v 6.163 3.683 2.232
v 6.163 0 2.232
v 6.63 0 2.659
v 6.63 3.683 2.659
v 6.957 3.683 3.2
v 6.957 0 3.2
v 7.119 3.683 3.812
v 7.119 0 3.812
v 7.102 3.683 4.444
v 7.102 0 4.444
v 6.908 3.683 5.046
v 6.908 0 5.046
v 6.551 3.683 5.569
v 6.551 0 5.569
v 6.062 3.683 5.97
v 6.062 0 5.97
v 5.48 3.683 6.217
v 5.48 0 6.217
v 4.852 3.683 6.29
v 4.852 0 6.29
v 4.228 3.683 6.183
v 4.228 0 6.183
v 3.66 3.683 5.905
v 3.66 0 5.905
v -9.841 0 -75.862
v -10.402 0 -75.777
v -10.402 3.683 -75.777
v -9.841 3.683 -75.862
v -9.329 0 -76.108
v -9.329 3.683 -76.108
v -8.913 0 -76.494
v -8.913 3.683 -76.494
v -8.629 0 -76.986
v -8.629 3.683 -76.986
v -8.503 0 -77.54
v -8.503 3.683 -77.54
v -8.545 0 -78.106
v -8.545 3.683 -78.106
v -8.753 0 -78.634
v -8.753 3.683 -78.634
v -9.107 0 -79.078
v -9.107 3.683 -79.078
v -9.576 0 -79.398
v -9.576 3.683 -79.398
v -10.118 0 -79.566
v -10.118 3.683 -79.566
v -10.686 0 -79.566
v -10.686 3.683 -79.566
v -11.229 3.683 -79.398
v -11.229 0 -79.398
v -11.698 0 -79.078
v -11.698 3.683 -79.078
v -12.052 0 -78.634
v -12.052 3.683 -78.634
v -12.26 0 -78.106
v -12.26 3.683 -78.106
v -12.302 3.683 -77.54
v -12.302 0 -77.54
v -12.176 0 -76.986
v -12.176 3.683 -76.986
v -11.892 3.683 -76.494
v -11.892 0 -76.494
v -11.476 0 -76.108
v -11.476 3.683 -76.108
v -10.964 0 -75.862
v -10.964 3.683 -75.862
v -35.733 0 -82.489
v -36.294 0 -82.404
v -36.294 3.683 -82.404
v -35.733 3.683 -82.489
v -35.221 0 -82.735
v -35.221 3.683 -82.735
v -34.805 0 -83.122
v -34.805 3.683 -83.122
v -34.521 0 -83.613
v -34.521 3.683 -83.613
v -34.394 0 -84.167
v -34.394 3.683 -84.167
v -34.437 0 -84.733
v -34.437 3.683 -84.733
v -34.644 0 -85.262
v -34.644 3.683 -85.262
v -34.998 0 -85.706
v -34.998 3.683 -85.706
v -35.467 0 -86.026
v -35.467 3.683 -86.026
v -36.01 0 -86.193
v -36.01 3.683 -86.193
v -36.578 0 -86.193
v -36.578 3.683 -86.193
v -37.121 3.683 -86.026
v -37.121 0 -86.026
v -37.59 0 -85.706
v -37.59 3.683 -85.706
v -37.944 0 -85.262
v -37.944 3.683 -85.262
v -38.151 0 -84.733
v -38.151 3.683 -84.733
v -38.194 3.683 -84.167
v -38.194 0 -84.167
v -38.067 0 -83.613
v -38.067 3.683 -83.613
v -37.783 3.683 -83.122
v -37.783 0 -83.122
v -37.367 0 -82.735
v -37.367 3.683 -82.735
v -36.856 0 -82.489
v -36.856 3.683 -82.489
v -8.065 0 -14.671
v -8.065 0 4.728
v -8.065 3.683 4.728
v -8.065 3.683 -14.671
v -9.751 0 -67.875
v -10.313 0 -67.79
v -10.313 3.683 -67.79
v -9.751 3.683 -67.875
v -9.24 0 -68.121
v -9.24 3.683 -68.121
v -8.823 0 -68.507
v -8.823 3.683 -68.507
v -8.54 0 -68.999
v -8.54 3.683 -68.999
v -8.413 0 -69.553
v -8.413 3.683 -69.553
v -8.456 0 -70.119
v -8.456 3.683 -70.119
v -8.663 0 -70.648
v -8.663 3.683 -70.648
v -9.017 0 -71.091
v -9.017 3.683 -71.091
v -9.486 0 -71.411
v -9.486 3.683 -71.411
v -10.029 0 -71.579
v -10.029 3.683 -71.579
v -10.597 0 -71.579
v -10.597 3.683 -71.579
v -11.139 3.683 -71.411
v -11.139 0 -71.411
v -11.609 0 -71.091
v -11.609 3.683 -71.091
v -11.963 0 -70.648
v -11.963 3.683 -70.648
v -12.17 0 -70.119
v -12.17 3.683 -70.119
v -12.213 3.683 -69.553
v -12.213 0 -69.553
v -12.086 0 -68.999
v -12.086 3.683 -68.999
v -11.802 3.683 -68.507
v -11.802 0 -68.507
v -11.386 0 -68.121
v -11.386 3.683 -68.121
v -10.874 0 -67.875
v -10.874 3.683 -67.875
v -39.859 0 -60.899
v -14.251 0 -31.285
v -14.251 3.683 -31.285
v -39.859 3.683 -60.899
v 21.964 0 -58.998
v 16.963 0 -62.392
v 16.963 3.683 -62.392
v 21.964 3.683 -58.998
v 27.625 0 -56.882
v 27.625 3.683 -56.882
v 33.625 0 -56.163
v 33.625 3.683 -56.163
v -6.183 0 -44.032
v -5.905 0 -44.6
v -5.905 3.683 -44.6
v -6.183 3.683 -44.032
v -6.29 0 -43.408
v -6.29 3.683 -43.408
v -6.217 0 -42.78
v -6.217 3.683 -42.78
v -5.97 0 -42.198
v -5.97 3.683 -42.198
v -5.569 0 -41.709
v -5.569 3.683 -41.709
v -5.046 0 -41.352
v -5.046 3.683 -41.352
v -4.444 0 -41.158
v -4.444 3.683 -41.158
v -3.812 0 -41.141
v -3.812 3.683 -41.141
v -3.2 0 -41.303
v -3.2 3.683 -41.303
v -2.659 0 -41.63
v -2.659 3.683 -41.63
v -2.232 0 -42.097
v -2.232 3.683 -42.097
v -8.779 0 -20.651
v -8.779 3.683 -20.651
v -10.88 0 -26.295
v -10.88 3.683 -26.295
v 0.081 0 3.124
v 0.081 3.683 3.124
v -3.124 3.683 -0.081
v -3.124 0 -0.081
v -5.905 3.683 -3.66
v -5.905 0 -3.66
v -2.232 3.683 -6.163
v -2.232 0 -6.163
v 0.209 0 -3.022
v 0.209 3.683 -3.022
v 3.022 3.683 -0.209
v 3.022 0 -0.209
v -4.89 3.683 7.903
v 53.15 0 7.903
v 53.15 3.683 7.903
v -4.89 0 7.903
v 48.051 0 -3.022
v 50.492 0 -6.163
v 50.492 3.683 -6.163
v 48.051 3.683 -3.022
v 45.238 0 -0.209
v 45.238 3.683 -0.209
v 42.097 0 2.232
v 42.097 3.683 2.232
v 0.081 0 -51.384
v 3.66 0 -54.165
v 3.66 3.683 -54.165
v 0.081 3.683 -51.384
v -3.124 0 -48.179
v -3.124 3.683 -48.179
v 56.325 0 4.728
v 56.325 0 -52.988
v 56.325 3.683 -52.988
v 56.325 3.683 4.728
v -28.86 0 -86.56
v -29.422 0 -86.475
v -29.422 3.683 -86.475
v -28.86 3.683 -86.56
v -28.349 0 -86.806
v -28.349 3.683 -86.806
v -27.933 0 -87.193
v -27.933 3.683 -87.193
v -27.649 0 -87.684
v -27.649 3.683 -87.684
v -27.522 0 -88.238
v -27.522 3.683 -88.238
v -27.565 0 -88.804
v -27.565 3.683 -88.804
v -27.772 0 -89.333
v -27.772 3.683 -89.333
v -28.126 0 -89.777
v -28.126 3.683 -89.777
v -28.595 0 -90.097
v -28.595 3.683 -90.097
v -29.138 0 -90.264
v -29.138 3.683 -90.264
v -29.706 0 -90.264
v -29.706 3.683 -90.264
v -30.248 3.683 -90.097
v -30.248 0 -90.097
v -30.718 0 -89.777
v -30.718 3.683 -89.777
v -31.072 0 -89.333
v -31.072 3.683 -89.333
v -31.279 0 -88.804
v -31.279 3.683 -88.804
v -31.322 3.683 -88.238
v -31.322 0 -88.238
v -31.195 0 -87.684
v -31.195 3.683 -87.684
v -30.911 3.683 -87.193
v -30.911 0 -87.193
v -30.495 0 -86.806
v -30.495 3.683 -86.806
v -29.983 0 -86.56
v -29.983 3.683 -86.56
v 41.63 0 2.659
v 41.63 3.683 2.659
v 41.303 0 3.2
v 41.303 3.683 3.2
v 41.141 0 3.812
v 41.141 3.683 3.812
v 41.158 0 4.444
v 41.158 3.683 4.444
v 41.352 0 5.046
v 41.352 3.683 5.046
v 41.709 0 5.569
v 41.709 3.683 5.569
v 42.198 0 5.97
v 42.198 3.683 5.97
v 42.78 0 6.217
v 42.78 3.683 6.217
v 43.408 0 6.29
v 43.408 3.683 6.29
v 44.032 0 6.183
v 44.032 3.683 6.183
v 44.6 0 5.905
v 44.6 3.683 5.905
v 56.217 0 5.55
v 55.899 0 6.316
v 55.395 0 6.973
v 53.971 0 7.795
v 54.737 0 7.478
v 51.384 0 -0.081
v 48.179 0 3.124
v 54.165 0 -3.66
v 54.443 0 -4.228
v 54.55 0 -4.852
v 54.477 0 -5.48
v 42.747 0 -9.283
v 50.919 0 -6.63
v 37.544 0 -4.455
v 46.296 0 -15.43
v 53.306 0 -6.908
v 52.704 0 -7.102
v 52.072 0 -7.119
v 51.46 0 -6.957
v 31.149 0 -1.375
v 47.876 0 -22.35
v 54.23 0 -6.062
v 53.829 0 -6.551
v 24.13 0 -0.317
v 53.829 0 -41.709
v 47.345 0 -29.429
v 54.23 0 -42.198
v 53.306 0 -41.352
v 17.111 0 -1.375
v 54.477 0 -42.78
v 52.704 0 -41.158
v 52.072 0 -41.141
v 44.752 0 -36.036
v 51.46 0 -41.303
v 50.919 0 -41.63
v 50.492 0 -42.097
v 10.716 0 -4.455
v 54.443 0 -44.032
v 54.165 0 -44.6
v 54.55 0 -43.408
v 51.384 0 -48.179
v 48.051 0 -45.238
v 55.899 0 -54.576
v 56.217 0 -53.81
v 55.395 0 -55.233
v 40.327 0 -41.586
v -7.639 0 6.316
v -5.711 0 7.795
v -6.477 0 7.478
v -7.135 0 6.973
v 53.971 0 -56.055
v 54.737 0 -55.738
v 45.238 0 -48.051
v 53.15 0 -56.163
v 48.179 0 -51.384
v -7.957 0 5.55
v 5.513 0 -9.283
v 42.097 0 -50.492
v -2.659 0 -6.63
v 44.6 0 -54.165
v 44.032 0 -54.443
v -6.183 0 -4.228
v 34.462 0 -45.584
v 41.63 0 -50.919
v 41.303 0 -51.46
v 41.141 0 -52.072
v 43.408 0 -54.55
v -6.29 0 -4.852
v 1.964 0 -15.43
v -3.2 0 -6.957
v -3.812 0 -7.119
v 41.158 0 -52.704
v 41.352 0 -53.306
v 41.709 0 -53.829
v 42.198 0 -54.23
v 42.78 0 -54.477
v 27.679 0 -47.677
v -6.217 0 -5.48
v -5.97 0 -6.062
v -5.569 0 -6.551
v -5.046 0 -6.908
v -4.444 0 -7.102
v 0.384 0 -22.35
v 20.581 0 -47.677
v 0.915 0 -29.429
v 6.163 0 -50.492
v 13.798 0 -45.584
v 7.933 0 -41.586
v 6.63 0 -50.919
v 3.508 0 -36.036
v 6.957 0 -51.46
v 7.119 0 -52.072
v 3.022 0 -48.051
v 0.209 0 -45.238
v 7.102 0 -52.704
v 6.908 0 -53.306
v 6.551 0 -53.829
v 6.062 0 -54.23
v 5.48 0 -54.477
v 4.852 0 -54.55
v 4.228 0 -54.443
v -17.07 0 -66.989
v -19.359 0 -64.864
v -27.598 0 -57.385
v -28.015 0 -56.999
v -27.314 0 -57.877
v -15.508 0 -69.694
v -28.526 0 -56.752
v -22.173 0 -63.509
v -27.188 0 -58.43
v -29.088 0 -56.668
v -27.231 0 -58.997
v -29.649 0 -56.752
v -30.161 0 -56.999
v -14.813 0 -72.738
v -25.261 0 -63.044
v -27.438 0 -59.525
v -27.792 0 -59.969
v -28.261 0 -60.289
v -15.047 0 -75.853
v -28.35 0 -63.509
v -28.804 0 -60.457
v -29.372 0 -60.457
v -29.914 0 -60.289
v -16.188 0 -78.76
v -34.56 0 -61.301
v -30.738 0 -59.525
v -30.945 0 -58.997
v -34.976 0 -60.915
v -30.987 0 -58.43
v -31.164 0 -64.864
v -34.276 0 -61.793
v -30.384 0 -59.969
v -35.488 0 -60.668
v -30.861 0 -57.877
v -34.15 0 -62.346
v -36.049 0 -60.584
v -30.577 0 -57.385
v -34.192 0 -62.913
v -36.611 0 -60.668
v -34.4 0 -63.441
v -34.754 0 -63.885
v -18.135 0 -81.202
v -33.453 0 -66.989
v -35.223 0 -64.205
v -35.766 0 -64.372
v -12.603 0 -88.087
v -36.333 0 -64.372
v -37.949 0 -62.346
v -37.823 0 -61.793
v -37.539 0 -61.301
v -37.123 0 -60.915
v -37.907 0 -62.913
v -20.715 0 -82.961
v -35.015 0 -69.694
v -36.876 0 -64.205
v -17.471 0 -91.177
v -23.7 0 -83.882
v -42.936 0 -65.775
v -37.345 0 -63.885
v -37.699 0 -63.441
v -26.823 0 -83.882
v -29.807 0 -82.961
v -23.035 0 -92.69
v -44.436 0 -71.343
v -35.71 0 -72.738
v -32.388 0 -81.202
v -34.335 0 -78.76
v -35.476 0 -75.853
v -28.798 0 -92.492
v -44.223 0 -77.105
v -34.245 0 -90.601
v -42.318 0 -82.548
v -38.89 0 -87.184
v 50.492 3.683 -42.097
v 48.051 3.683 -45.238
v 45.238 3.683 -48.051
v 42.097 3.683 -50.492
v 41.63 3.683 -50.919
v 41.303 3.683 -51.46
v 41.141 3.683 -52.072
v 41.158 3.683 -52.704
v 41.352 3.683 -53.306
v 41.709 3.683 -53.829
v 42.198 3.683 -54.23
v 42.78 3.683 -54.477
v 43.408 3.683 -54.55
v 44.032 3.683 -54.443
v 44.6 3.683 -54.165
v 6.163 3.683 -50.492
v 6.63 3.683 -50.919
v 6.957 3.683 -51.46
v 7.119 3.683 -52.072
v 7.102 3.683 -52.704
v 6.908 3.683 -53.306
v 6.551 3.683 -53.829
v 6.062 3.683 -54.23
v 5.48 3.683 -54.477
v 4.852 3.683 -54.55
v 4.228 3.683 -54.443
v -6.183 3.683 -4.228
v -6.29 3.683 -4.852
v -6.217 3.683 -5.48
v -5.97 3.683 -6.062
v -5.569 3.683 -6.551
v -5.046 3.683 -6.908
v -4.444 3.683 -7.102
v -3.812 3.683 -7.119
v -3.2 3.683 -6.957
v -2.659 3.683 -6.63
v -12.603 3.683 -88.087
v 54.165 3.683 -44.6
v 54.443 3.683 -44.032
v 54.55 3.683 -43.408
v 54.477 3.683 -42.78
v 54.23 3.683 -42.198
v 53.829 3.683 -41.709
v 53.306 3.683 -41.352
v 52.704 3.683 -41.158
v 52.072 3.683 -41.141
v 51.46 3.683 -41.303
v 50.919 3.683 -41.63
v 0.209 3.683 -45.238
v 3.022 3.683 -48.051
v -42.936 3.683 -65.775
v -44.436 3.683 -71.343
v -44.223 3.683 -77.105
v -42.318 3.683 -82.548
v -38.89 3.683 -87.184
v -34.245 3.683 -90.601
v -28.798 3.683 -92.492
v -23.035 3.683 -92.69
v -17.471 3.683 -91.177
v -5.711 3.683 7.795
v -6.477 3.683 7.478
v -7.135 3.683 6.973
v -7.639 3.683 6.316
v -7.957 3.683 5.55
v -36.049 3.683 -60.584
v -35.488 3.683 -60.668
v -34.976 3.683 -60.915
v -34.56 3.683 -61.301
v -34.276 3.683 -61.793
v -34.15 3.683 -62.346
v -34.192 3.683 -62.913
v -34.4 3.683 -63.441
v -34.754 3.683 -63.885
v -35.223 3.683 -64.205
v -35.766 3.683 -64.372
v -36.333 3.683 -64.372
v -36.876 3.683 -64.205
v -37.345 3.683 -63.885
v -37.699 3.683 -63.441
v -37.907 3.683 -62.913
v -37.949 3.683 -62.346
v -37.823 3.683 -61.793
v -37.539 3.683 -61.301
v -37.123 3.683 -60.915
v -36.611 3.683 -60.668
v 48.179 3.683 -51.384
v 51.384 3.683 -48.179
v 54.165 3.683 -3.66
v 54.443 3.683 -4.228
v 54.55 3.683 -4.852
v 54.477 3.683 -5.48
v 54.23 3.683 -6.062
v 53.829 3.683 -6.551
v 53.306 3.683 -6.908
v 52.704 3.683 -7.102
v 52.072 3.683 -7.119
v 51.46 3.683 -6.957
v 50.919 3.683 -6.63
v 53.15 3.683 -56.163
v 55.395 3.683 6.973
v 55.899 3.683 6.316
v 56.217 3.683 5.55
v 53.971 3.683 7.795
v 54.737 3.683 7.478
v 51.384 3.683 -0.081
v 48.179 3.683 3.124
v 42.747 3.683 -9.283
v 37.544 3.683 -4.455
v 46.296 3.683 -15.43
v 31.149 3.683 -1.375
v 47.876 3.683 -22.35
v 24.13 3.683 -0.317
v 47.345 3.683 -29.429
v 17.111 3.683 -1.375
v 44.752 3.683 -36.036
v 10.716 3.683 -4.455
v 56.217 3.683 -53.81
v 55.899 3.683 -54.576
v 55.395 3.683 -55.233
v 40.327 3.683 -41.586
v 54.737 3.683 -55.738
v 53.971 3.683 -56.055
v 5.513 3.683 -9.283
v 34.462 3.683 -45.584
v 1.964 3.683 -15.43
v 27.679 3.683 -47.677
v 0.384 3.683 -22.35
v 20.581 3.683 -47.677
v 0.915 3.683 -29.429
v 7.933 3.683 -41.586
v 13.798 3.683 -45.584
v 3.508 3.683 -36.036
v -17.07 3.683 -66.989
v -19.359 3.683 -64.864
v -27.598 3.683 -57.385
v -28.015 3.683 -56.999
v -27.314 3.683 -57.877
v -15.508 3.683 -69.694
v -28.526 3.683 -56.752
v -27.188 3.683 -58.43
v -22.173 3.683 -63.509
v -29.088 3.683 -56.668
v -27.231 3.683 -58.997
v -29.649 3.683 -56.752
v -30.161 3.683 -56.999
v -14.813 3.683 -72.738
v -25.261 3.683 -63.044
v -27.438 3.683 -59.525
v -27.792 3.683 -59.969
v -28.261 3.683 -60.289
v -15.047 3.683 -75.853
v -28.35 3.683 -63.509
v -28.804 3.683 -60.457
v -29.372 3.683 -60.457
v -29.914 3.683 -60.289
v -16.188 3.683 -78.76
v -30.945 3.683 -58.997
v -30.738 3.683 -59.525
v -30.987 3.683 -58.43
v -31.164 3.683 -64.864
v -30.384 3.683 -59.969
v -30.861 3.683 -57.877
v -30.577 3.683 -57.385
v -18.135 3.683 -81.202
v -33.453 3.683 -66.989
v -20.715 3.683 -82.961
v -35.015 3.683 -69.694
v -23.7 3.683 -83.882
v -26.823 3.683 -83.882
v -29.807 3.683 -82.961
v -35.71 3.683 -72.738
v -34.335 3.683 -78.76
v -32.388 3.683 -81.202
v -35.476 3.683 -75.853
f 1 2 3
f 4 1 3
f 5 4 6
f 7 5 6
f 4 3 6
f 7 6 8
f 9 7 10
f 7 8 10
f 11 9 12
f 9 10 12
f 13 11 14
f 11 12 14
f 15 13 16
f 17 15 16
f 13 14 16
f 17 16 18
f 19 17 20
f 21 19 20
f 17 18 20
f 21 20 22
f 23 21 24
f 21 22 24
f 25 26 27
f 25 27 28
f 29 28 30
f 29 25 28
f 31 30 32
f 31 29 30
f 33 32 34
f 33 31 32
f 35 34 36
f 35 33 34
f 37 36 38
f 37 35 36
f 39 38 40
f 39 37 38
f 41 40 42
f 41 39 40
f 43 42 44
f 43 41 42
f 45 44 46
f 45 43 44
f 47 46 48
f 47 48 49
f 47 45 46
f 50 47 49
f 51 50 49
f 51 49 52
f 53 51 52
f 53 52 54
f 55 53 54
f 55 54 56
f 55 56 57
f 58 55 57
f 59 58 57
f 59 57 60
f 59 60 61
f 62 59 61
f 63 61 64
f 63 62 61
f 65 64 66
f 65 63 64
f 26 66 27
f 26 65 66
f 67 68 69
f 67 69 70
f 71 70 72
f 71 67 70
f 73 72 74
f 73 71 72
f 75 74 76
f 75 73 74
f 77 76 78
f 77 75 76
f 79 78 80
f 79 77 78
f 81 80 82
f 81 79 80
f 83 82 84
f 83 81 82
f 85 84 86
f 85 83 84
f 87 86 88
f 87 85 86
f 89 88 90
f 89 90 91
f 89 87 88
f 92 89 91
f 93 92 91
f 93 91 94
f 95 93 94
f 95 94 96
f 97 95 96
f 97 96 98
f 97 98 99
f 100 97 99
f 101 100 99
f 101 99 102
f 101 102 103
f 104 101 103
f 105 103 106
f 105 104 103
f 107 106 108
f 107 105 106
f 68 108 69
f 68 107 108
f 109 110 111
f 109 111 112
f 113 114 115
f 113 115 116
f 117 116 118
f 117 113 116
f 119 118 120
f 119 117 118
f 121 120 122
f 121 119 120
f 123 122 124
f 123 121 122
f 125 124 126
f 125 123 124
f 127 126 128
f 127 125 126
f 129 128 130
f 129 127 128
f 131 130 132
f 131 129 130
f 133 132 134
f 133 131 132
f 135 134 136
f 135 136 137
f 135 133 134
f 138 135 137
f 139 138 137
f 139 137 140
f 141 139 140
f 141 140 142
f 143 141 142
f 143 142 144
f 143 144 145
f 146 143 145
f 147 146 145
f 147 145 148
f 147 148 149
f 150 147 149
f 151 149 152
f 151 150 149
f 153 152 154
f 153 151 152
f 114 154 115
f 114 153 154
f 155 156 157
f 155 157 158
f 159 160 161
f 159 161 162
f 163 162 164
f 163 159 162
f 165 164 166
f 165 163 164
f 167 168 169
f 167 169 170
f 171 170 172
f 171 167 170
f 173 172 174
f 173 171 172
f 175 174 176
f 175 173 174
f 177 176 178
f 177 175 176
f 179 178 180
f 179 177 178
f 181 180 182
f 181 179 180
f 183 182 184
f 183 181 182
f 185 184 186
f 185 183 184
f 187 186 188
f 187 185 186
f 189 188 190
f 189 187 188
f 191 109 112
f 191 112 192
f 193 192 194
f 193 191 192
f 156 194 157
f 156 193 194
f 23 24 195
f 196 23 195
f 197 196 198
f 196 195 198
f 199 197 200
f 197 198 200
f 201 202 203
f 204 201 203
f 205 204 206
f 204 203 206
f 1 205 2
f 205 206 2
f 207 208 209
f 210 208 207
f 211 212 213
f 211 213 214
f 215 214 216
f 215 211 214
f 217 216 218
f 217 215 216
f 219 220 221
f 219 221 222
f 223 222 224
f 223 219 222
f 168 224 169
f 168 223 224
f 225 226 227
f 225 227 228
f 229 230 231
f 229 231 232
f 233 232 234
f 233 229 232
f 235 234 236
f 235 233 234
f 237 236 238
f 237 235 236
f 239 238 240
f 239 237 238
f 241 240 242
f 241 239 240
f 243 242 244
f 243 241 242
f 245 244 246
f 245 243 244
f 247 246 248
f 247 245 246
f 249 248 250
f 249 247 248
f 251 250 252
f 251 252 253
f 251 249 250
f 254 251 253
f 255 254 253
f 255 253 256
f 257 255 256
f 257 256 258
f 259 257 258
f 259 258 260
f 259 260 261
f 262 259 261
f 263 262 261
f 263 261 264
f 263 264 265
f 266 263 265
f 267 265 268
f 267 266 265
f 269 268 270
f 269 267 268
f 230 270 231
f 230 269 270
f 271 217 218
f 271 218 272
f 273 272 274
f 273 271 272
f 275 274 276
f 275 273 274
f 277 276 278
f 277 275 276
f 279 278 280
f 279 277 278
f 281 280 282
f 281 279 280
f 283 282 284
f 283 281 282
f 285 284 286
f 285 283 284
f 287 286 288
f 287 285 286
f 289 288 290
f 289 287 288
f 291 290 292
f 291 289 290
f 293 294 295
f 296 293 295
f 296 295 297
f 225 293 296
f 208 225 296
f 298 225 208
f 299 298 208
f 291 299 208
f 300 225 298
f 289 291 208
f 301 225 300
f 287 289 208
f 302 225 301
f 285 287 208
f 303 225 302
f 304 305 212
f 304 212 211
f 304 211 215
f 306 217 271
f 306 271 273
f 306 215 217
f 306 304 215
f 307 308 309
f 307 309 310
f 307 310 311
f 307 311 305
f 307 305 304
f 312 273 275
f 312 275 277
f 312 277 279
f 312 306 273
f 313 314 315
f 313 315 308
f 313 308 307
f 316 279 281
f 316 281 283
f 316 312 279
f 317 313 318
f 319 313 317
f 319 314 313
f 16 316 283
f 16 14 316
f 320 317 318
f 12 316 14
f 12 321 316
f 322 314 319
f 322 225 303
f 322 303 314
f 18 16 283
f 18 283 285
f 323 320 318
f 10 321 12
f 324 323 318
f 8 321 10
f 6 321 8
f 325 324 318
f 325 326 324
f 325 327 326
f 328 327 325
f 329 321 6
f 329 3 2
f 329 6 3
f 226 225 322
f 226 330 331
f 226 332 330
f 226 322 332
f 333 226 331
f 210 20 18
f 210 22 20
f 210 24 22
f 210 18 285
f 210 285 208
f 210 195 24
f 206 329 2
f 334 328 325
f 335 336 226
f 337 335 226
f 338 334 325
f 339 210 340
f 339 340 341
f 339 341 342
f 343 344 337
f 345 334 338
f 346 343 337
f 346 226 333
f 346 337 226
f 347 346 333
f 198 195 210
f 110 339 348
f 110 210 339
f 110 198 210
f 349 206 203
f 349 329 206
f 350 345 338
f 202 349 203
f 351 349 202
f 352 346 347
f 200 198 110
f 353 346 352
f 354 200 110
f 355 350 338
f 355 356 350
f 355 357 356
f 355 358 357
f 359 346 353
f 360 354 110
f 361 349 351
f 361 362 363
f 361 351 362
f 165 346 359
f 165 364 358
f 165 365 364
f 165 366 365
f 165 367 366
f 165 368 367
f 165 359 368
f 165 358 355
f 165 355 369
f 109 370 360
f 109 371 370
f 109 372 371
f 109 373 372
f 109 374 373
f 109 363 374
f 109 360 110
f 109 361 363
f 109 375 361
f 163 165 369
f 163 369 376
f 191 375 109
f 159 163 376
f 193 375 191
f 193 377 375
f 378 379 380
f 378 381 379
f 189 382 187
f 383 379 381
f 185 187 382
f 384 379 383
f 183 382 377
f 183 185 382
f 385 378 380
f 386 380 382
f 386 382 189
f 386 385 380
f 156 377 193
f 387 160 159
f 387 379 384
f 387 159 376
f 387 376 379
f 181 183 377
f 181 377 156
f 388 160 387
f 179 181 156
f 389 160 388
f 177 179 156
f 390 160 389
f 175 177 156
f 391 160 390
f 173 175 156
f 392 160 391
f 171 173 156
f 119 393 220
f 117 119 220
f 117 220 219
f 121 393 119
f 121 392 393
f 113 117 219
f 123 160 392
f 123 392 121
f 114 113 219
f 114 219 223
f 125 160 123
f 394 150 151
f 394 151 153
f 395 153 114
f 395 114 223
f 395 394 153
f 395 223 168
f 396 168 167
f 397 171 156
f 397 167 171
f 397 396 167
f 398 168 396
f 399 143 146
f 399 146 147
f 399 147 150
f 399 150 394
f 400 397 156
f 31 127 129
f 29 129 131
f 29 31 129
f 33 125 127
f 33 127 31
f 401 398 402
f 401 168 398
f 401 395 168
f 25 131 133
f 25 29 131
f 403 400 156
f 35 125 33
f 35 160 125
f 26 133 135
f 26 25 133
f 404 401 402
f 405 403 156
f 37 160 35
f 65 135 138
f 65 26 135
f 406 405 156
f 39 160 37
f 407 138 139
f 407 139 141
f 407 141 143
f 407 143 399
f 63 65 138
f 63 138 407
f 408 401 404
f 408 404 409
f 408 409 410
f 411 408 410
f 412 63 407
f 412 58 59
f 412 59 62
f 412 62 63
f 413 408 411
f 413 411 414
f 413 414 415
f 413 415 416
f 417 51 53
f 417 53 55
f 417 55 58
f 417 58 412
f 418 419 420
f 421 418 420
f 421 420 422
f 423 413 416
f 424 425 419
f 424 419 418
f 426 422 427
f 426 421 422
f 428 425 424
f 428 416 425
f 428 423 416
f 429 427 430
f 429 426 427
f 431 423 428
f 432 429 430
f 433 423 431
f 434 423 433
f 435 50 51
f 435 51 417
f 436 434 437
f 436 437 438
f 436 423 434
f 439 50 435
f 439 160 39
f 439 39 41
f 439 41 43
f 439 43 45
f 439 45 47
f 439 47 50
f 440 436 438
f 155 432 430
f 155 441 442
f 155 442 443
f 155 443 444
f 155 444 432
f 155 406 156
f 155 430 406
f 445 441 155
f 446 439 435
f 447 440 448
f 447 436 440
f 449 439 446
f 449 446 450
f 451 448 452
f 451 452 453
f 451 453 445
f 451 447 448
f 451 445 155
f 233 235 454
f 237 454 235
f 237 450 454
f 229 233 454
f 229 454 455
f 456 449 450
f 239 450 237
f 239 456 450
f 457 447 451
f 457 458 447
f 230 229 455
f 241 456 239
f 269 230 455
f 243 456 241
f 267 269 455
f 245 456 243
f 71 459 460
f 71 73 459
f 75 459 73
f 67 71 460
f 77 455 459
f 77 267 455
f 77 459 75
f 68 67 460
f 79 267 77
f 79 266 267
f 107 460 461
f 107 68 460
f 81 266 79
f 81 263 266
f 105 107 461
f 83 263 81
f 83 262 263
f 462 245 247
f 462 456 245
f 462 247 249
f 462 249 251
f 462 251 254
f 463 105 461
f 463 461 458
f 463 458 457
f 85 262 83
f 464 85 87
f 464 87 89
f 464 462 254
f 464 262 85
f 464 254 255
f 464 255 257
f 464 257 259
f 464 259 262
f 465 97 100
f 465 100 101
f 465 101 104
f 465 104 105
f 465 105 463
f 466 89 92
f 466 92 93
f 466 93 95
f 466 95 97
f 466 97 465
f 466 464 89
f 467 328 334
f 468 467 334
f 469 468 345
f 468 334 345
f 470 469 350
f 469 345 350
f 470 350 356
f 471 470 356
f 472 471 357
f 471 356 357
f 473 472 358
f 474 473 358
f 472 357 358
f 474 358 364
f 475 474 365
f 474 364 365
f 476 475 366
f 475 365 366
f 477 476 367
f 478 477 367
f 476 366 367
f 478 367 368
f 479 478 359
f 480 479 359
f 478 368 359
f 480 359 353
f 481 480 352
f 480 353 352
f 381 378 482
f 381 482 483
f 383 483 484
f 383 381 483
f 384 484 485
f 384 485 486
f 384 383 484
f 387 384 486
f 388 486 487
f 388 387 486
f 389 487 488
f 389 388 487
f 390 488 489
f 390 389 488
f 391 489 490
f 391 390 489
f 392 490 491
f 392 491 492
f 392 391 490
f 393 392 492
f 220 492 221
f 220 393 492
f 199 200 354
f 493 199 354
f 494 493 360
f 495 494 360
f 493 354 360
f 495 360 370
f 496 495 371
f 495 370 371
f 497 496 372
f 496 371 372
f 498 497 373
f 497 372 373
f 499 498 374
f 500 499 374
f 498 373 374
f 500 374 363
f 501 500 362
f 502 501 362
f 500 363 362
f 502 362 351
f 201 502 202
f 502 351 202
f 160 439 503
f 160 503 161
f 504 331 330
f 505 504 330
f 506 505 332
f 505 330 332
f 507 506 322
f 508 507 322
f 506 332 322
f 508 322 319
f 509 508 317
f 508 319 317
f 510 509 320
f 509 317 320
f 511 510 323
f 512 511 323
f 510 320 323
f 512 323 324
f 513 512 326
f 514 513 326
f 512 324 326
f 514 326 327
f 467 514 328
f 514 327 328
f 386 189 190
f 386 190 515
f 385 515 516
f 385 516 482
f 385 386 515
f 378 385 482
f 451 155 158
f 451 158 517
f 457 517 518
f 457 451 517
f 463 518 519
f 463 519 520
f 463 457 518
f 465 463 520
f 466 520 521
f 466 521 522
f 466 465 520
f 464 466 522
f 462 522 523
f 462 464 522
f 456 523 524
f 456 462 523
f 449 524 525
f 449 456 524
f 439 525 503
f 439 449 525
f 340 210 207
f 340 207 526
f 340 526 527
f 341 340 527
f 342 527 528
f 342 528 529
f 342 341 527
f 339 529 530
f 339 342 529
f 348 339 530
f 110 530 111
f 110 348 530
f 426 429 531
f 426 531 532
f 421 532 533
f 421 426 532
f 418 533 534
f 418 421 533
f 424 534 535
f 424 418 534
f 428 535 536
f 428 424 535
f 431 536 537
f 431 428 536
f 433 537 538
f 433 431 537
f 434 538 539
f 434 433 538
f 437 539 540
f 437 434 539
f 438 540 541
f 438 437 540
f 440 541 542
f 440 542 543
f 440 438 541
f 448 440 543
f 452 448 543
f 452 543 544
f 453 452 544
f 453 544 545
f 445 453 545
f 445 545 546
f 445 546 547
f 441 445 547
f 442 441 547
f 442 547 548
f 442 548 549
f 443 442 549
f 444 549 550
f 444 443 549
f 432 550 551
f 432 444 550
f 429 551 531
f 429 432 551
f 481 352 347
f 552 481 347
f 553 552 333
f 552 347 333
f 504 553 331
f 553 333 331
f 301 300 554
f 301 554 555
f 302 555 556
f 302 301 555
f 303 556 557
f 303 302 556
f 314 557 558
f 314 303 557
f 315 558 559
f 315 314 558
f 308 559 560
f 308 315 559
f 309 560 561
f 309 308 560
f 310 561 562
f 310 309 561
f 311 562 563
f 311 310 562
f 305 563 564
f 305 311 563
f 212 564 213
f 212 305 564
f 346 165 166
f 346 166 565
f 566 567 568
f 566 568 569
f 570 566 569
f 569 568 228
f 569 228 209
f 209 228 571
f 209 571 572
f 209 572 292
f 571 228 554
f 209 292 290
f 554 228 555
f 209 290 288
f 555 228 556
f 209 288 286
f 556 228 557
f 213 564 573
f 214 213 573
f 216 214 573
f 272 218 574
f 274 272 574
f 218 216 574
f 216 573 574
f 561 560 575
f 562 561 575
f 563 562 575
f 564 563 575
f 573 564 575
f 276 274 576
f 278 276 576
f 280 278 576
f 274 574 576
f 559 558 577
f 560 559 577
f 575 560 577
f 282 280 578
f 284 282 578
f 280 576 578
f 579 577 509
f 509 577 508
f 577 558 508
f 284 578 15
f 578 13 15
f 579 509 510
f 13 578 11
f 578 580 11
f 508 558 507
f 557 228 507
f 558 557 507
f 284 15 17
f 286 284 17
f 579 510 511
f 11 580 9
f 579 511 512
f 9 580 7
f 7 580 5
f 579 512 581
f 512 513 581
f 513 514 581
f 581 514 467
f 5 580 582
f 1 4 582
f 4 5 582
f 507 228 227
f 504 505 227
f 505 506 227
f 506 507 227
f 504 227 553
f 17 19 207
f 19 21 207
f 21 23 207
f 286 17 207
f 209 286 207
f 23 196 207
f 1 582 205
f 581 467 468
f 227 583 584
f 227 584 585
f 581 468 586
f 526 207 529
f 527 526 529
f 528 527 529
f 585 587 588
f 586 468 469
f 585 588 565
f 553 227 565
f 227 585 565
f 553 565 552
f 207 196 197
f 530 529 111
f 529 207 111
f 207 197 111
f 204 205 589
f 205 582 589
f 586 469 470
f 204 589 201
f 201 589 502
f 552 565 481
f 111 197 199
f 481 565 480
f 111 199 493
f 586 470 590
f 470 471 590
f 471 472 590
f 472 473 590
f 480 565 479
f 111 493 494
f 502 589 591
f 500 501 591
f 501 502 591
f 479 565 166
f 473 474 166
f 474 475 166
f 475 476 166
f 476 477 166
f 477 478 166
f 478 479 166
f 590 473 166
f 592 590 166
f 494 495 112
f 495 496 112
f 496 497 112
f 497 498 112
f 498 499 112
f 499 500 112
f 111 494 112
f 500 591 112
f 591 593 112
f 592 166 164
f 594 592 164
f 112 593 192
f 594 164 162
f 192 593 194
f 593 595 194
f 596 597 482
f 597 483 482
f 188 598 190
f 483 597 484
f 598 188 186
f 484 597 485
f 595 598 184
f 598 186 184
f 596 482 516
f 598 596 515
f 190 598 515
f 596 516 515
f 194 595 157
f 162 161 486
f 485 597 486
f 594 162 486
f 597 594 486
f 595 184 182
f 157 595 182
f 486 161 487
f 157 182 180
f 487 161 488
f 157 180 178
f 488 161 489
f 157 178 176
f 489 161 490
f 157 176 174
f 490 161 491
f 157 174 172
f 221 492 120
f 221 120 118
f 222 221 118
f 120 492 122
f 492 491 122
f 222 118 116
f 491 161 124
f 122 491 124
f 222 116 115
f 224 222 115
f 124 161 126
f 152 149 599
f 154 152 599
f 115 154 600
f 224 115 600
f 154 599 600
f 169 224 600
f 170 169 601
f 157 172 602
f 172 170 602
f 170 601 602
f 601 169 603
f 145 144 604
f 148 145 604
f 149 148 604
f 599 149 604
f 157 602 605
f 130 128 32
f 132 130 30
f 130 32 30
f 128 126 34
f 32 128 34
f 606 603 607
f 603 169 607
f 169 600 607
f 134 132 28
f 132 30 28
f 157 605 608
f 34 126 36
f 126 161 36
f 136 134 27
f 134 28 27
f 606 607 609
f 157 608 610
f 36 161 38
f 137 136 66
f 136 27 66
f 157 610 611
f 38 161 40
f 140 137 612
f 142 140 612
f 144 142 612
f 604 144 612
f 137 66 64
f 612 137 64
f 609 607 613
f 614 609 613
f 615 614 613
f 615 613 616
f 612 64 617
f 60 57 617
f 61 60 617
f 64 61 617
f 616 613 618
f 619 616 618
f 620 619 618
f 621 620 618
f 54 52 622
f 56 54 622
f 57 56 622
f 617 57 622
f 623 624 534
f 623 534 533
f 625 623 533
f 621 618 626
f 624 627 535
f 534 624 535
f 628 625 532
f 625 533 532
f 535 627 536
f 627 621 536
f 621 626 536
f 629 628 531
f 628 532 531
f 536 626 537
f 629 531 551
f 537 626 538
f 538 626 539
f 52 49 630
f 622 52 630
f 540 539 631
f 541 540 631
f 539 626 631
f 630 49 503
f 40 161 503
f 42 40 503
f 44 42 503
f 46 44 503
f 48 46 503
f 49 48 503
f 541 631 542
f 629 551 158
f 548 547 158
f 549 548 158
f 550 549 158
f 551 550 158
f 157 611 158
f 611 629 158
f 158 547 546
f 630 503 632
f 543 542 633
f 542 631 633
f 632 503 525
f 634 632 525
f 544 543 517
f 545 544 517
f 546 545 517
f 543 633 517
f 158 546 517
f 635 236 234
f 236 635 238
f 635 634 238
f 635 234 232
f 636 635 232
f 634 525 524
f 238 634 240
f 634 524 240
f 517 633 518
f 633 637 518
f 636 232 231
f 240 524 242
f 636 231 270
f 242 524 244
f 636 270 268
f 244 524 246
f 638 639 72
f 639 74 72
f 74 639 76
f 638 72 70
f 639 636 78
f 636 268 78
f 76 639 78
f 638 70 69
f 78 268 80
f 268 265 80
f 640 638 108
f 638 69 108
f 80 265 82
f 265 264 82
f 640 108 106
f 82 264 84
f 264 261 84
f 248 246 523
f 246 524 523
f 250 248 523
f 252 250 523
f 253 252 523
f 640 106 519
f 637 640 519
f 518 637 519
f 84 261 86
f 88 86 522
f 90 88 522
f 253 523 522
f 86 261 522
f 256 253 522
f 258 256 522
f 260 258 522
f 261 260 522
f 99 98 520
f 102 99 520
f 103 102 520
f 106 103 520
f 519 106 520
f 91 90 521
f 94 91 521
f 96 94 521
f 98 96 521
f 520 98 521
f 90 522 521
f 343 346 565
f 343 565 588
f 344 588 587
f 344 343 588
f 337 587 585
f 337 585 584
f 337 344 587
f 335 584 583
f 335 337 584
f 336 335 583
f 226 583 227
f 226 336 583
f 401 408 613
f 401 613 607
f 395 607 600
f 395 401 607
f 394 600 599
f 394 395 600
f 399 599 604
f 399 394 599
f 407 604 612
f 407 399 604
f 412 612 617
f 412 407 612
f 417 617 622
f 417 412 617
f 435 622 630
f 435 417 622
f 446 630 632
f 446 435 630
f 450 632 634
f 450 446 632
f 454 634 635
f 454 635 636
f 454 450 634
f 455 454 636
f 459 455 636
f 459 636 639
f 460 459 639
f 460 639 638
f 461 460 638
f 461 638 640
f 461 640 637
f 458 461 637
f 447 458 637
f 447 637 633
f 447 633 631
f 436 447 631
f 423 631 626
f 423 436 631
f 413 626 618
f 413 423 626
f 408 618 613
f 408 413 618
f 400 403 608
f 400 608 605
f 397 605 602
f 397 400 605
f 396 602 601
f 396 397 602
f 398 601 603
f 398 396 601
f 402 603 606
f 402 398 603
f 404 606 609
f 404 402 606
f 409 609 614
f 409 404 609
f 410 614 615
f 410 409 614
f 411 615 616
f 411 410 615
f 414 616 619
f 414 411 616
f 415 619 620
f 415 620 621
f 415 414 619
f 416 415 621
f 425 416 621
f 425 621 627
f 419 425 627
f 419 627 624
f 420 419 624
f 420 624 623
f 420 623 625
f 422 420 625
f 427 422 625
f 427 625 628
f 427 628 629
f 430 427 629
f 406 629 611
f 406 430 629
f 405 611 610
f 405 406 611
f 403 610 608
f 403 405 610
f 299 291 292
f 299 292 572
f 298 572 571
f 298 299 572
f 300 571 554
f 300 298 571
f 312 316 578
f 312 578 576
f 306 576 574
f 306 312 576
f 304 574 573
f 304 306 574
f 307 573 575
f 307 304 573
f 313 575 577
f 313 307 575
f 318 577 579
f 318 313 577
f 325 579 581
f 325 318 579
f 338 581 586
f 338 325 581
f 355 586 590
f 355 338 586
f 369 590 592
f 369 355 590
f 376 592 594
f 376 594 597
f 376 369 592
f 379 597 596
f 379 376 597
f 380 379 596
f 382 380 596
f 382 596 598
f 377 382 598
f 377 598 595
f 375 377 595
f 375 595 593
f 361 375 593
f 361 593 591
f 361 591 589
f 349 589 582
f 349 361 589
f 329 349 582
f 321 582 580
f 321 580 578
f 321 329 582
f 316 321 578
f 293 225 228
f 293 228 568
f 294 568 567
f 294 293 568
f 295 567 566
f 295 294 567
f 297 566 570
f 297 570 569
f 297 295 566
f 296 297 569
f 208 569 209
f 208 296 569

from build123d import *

# Parameters (mm, degrees)
SKETCH1_R           = 23.8125
SKETCH1_R_2         = 10.4775
SKETCH1_R_3         = 1.905
BOSS_EXTRUDE1_DEPTH = 3.683


with BuildPart() as part:
    # Sketch1 → Boss-Extrude1 (new body)
    with BuildSketch(Plane(origin=(0, 0, 0), x_dir=(1, 0, 0), z_dir=(0, 1, 0))):
        with BuildLine():
            Line((-8.06473402, -4.72806869), (-8.06473402, 14.671308994))
            ThreePointArc((-8.06473402, 14.671308994), (-9.661605647, 23.535341917), (-14.251433206, 31.284829748))
            Line((-14.251433206, 31.284829748), (-39.858713959, 60.899286273))
            ThreePointArc((-39.858713959, 60.899286273), (-38.889761495, 87.184032671), (-12.602664438, 88.086967018))
            Line((-12.602664438, 88.086967018), (16.963304526, 62.391553913))
            ThreePointArc((16.963304526, 62.391553913), (24.731110608, 57.771090259), (33.625027761, 56.16306869))
            Line((33.625027761, 56.16306869), (53.14973402, 56.16306869))
            ThreePointArc((53.14973402, 56.16306869), (55.39479805, 55.23313272), (56.32473402, 52.98806869))
            Line((56.32473402, 52.98806869), (56.32473402, -4.72806869))
            ThreePointArc((56.32473402, -4.72806869), (55.39479805, -6.97313272), (53.14973402, -7.90306869))
            Line((53.14973402, -7.90306869), (-4.88973402, -7.90306869))
            ThreePointArc((-4.88973402, -7.90306869), (-7.13479805, -6.97313272), (-8.06473402, -4.72806869))
        make_face()
        with Locations(Location((24.13, 24.13, 0), (0, 0, 270))):
            Circle(SKETCH1_R, mode=Mode.SUBTRACT)
        with Locations(Location((-25.261408666, 73.521408666, 0), (0, 0, 270))):
            Circle(SKETCH1_R_2, mode=Mode.SUBTRACT)
        with Locations(Location((-36.294042469, 84.309426168, 0), (0, 0, 270))):
            Circle(SKETCH1_R_3, mode=Mode.SUBTRACT)
        with Locations(Location((-29.421941059, 88.38042278, 0), (0, 0, 270))):
            Circle(SKETCH1_R_3, mode=Mode.SUBTRACT)
        with Locations(Location((-10.402394551, 77.681941059, 0), (0, 0, 270))):
            Circle(SKETCH1_R_3, mode=Mode.SUBTRACT)
        with Locations(Location((-10.312858771, 69.695028354, 0), (0, 0, 270))):
            Circle(SKETCH1_R_3, mode=Mode.SUBTRACT)
        with Locations(Location((-29.087788977, 58.572858771, 0), (0, 0, 270))):
            Circle(SKETCH1_R_3, mode=Mode.SUBTRACT)
        with Locations(Location((-36.049426168, 62.488774863, 0), (0, 0, 270))):
            Circle(SKETCH1_R_3, mode=Mode.SUBTRACT)
        with BuildLine():
            ThreePointArc((44.60009114, -5.905215683), (49.831544821, -1.571544821), (54.165215683, 3.65990886))
            ThreePointArc((54.165215683, 3.65990886), (53.580347261, 6.748102738), (50.492153383, 6.163234317))
            ThreePointArc((50.492153383, 6.163234317), (46.688455179, 1.571544821), (42.096765683, -2.232153383))
            ThreePointArc((42.096765683, -2.232153383), (41.511897262, -5.320347261), (44.60009114, -5.905215683))
        make_face(mode=Mode.SUBTRACT)
        with BuildLine():
            ThreePointArc((44.60009114, 54.165215683), (49.831544821, 49.831544821), (54.165215683, 44.60009114))
            ThreePointArc((54.165215683, 44.60009114), (53.580347261, 41.511897262), (50.492153383, 42.096765683))
            ThreePointArc((50.492153383, 42.096765683), (46.688455179, 46.688455179), (42.096765683, 50.492153383))
            ThreePointArc((42.096765683, 50.492153383), (41.511897262, 53.580347261), (44.60009114, 54.165215683))
        make_face(mode=Mode.SUBTRACT)
        with BuildLine():
            ThreePointArc((3.65990886, -5.905215683), (-1.571544821, -1.571544821), (-5.905215683, 3.65990886))
            ThreePointArc((-5.905215683, 3.65990886), (-5.320347261, 6.748102738), (-2.232153383, 6.163234317))
            ThreePointArc((-2.232153383, 6.163234317), (1.571544821, 1.571544821), (6.163234317, -2.232153383))
            ThreePointArc((6.163234317, -2.232153383), (6.748102738, -5.320347261), (3.65990886, -5.905215683))
        make_face(mode=Mode.SUBTRACT)
        with BuildLine():
            ThreePointArc((3.65990886, 54.165215683), (-1.571544821, 49.831544821), (-5.905215683, 44.60009114))
            ThreePointArc((-5.905215683, 44.60009114), (-5.320347261, 41.511897262), (-2.232153383, 42.096765683))
            ThreePointArc((-2.232153383, 42.096765683), (1.571544821, 46.688455179), (6.163234317, 50.492153383))
            ThreePointArc((6.163234317, 50.492153383), (6.748102738, 53.580347261), (3.65990886, 54.165215683))
        make_face(mode=Mode.SUBTRACT)
    extrude(amount=BOSS_EXTRUDE1_DEPTH)


solid = part.part
